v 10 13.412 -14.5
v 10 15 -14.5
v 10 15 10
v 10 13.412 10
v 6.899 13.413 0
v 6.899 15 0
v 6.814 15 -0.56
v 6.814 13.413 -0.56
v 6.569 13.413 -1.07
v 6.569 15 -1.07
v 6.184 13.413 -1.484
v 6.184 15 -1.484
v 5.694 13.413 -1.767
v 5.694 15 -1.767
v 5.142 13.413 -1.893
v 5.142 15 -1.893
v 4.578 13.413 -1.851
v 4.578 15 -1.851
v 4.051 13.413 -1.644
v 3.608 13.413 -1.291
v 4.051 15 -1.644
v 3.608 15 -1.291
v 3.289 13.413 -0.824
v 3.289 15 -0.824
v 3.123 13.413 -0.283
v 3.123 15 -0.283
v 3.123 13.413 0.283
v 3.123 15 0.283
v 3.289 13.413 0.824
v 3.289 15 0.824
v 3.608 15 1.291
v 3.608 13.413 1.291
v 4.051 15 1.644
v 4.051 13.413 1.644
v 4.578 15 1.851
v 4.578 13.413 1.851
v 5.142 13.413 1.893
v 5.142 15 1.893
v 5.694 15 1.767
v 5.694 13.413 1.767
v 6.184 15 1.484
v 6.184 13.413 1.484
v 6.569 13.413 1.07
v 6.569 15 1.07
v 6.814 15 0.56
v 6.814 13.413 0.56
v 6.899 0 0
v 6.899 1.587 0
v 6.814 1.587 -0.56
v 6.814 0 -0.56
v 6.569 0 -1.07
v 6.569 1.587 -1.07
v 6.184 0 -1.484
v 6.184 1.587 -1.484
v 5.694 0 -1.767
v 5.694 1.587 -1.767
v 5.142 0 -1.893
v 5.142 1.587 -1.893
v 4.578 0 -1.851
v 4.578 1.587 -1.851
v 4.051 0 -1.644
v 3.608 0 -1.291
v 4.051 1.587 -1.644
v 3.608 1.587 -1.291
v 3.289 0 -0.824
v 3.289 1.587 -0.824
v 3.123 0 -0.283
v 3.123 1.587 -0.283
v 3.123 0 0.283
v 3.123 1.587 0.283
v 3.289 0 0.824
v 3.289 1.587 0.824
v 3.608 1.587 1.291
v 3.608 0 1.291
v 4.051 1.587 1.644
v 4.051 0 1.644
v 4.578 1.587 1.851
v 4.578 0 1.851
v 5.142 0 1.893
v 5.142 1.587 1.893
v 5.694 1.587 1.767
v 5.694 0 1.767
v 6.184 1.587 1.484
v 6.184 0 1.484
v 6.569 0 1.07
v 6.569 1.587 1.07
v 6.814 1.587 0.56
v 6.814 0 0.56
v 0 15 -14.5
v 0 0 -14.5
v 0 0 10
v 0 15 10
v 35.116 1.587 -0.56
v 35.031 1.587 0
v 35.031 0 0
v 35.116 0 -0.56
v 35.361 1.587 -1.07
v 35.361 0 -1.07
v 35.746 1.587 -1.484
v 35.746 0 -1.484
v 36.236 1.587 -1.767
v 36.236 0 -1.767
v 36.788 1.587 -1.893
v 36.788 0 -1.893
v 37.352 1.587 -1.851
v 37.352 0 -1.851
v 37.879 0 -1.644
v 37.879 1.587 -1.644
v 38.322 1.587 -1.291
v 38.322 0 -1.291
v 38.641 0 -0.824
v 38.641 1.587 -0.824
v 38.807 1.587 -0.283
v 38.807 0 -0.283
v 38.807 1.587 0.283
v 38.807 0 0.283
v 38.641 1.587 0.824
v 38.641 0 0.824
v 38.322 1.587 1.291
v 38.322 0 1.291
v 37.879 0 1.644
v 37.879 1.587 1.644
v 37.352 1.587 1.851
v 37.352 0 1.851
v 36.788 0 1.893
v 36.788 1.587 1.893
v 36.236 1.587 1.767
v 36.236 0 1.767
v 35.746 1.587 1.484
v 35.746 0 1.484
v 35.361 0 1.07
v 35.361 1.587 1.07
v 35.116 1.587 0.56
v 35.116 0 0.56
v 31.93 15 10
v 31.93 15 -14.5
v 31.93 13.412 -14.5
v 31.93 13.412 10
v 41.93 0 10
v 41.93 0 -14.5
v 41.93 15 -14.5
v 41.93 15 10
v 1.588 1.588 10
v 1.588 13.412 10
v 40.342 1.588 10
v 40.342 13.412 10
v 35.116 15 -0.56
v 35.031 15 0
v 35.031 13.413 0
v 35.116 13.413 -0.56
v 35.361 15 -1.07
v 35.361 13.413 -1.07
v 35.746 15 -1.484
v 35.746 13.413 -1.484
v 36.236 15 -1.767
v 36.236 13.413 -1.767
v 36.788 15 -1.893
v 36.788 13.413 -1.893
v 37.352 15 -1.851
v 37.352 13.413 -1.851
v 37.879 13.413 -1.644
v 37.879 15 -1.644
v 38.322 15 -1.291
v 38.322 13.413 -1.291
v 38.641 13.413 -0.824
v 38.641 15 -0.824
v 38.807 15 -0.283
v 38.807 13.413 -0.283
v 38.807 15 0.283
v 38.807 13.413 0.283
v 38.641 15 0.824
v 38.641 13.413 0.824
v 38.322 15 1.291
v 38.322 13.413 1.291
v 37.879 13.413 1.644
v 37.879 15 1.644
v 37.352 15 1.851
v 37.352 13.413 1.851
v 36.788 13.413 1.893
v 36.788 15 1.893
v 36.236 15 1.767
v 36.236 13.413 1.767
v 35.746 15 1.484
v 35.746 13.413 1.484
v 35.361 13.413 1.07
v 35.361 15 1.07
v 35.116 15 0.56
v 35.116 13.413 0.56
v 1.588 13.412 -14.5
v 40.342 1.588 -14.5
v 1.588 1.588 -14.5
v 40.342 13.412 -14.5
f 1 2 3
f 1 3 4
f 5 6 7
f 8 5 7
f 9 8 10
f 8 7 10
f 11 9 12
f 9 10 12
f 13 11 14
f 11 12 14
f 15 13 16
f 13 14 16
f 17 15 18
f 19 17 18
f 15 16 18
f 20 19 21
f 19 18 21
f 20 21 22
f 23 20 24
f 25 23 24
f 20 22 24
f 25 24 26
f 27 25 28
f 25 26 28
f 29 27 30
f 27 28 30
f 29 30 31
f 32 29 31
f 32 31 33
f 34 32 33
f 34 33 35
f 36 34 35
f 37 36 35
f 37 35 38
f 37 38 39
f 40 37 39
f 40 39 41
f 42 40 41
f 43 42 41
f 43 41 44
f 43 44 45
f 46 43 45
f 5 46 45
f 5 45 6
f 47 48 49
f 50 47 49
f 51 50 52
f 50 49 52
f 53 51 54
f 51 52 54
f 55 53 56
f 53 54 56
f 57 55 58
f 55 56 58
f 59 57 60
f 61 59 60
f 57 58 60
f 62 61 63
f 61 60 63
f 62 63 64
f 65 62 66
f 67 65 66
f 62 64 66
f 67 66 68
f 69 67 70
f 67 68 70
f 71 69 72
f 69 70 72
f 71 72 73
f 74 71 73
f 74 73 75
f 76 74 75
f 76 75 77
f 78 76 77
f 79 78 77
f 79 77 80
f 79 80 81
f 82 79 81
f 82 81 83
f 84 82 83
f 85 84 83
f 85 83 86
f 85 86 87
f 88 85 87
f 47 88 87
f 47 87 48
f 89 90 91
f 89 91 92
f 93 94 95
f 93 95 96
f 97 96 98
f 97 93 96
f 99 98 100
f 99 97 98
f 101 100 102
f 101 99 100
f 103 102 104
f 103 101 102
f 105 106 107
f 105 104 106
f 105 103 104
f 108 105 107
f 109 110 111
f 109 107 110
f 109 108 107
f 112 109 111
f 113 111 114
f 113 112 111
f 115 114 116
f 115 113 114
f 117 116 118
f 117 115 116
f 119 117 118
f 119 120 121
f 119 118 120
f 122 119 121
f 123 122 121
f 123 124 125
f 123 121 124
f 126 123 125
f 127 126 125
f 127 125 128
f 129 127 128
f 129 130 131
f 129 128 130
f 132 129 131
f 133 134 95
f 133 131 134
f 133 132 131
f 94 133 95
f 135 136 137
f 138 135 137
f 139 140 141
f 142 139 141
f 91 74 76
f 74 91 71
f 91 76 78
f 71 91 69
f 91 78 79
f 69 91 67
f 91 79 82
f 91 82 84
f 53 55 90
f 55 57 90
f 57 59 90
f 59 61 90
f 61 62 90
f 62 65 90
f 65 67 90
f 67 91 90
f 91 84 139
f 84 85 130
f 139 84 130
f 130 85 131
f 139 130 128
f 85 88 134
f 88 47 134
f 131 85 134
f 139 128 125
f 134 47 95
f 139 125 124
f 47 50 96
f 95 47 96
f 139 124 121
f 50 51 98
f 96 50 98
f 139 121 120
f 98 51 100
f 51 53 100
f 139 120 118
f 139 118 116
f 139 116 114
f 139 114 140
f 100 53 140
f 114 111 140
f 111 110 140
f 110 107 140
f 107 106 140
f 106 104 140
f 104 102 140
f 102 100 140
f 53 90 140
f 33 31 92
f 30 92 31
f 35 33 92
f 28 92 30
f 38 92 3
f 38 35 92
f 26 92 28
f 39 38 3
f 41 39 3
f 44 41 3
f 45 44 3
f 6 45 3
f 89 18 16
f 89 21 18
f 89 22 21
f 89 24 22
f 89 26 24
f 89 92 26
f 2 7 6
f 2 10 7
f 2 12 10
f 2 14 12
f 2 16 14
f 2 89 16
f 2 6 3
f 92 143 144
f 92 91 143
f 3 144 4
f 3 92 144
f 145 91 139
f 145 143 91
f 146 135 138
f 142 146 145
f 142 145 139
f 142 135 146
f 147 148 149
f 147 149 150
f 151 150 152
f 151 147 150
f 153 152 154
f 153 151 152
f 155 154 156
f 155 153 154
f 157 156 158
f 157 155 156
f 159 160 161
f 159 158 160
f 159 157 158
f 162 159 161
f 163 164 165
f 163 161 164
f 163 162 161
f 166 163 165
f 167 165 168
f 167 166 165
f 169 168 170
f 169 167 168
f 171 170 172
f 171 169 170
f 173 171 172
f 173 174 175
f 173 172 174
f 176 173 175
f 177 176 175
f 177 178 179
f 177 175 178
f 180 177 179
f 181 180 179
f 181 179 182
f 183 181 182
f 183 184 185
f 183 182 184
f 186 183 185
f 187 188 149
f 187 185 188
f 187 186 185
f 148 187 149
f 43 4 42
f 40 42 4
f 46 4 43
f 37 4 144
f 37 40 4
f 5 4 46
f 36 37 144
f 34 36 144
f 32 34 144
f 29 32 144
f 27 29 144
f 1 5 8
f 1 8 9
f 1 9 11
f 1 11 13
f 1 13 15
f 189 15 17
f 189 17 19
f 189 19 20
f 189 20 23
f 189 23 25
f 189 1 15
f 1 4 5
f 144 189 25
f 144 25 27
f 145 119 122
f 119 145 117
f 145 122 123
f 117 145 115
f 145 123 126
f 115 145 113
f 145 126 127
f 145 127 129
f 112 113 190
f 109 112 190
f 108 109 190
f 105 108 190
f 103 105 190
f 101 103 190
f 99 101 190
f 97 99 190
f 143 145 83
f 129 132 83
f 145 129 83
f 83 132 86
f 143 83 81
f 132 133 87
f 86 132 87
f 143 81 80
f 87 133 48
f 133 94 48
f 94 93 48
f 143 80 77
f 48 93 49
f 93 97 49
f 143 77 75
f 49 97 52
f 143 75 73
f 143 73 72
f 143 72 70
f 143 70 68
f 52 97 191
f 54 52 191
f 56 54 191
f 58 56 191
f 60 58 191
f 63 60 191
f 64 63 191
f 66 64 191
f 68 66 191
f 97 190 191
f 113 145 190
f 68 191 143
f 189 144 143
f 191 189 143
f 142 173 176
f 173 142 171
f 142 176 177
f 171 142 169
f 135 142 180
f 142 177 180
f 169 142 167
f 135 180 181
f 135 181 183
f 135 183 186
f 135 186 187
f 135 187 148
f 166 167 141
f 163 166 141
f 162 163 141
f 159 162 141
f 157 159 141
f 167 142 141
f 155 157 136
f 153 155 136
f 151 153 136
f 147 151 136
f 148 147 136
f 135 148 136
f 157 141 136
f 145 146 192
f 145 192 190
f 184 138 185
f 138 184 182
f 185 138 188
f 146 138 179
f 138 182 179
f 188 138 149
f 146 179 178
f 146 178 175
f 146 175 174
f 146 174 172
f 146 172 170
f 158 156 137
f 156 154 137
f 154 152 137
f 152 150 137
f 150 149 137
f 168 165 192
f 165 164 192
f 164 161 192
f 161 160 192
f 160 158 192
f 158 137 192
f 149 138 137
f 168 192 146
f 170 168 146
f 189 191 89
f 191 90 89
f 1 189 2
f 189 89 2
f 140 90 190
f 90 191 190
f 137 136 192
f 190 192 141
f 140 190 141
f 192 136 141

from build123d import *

# Parameters (mm, degrees)
BOSS_EXTRUDE1_START   = -14.5
BOSS_EXTRUDE1_DEPTH   = 24.5
F_6_CLEARANCE_HOLE1_D = 3.7973


with BuildPart() as part:
    # Sketch1 → Boss-Extrude1 (new body)
    with BuildSketch(Plane.XY.offset(BOSS_EXTRUDE1_START)):
        Polygon((20.965, 0), (0, 0), (0, 15), (10, 15), (10, 13.4125), (1.5875, 13.4125), (1.5875, 1.5875), (20.965, 1.5875), align=None)
    boss_extrude1 = extrude(amount=BOSS_EXTRUDE1_DEPTH)

    # #6 Clearance Hole1 (through all)
    with Locations(Plane(origin=(0, 0, 0), x_dir=(-1, 0, 0), z_dir=(0, -1, 0))):
        with Locations((-5, 0)):
            f_6_clearance_hole1 = Hole(F_6_CLEARANCE_HOLE1_D / 2)

    # Mirror1: Boss-Extrude1, #6 Clearance Hole1 across plane
    add(boss_extrude1.mirror(Plane(origin=(20.965, 1.5875, -14.5), x_dir=(0, 0, 1), z_dir=(1, 0, 0))))
    add(f_6_clearance_hole1.mirror(Plane(origin=(20.965, 1.5875, -14.5), x_dir=(0, 0, 1), z_dir=(1, 0, 0))), mode=Mode.SUBTRACT)


solid = part.part
